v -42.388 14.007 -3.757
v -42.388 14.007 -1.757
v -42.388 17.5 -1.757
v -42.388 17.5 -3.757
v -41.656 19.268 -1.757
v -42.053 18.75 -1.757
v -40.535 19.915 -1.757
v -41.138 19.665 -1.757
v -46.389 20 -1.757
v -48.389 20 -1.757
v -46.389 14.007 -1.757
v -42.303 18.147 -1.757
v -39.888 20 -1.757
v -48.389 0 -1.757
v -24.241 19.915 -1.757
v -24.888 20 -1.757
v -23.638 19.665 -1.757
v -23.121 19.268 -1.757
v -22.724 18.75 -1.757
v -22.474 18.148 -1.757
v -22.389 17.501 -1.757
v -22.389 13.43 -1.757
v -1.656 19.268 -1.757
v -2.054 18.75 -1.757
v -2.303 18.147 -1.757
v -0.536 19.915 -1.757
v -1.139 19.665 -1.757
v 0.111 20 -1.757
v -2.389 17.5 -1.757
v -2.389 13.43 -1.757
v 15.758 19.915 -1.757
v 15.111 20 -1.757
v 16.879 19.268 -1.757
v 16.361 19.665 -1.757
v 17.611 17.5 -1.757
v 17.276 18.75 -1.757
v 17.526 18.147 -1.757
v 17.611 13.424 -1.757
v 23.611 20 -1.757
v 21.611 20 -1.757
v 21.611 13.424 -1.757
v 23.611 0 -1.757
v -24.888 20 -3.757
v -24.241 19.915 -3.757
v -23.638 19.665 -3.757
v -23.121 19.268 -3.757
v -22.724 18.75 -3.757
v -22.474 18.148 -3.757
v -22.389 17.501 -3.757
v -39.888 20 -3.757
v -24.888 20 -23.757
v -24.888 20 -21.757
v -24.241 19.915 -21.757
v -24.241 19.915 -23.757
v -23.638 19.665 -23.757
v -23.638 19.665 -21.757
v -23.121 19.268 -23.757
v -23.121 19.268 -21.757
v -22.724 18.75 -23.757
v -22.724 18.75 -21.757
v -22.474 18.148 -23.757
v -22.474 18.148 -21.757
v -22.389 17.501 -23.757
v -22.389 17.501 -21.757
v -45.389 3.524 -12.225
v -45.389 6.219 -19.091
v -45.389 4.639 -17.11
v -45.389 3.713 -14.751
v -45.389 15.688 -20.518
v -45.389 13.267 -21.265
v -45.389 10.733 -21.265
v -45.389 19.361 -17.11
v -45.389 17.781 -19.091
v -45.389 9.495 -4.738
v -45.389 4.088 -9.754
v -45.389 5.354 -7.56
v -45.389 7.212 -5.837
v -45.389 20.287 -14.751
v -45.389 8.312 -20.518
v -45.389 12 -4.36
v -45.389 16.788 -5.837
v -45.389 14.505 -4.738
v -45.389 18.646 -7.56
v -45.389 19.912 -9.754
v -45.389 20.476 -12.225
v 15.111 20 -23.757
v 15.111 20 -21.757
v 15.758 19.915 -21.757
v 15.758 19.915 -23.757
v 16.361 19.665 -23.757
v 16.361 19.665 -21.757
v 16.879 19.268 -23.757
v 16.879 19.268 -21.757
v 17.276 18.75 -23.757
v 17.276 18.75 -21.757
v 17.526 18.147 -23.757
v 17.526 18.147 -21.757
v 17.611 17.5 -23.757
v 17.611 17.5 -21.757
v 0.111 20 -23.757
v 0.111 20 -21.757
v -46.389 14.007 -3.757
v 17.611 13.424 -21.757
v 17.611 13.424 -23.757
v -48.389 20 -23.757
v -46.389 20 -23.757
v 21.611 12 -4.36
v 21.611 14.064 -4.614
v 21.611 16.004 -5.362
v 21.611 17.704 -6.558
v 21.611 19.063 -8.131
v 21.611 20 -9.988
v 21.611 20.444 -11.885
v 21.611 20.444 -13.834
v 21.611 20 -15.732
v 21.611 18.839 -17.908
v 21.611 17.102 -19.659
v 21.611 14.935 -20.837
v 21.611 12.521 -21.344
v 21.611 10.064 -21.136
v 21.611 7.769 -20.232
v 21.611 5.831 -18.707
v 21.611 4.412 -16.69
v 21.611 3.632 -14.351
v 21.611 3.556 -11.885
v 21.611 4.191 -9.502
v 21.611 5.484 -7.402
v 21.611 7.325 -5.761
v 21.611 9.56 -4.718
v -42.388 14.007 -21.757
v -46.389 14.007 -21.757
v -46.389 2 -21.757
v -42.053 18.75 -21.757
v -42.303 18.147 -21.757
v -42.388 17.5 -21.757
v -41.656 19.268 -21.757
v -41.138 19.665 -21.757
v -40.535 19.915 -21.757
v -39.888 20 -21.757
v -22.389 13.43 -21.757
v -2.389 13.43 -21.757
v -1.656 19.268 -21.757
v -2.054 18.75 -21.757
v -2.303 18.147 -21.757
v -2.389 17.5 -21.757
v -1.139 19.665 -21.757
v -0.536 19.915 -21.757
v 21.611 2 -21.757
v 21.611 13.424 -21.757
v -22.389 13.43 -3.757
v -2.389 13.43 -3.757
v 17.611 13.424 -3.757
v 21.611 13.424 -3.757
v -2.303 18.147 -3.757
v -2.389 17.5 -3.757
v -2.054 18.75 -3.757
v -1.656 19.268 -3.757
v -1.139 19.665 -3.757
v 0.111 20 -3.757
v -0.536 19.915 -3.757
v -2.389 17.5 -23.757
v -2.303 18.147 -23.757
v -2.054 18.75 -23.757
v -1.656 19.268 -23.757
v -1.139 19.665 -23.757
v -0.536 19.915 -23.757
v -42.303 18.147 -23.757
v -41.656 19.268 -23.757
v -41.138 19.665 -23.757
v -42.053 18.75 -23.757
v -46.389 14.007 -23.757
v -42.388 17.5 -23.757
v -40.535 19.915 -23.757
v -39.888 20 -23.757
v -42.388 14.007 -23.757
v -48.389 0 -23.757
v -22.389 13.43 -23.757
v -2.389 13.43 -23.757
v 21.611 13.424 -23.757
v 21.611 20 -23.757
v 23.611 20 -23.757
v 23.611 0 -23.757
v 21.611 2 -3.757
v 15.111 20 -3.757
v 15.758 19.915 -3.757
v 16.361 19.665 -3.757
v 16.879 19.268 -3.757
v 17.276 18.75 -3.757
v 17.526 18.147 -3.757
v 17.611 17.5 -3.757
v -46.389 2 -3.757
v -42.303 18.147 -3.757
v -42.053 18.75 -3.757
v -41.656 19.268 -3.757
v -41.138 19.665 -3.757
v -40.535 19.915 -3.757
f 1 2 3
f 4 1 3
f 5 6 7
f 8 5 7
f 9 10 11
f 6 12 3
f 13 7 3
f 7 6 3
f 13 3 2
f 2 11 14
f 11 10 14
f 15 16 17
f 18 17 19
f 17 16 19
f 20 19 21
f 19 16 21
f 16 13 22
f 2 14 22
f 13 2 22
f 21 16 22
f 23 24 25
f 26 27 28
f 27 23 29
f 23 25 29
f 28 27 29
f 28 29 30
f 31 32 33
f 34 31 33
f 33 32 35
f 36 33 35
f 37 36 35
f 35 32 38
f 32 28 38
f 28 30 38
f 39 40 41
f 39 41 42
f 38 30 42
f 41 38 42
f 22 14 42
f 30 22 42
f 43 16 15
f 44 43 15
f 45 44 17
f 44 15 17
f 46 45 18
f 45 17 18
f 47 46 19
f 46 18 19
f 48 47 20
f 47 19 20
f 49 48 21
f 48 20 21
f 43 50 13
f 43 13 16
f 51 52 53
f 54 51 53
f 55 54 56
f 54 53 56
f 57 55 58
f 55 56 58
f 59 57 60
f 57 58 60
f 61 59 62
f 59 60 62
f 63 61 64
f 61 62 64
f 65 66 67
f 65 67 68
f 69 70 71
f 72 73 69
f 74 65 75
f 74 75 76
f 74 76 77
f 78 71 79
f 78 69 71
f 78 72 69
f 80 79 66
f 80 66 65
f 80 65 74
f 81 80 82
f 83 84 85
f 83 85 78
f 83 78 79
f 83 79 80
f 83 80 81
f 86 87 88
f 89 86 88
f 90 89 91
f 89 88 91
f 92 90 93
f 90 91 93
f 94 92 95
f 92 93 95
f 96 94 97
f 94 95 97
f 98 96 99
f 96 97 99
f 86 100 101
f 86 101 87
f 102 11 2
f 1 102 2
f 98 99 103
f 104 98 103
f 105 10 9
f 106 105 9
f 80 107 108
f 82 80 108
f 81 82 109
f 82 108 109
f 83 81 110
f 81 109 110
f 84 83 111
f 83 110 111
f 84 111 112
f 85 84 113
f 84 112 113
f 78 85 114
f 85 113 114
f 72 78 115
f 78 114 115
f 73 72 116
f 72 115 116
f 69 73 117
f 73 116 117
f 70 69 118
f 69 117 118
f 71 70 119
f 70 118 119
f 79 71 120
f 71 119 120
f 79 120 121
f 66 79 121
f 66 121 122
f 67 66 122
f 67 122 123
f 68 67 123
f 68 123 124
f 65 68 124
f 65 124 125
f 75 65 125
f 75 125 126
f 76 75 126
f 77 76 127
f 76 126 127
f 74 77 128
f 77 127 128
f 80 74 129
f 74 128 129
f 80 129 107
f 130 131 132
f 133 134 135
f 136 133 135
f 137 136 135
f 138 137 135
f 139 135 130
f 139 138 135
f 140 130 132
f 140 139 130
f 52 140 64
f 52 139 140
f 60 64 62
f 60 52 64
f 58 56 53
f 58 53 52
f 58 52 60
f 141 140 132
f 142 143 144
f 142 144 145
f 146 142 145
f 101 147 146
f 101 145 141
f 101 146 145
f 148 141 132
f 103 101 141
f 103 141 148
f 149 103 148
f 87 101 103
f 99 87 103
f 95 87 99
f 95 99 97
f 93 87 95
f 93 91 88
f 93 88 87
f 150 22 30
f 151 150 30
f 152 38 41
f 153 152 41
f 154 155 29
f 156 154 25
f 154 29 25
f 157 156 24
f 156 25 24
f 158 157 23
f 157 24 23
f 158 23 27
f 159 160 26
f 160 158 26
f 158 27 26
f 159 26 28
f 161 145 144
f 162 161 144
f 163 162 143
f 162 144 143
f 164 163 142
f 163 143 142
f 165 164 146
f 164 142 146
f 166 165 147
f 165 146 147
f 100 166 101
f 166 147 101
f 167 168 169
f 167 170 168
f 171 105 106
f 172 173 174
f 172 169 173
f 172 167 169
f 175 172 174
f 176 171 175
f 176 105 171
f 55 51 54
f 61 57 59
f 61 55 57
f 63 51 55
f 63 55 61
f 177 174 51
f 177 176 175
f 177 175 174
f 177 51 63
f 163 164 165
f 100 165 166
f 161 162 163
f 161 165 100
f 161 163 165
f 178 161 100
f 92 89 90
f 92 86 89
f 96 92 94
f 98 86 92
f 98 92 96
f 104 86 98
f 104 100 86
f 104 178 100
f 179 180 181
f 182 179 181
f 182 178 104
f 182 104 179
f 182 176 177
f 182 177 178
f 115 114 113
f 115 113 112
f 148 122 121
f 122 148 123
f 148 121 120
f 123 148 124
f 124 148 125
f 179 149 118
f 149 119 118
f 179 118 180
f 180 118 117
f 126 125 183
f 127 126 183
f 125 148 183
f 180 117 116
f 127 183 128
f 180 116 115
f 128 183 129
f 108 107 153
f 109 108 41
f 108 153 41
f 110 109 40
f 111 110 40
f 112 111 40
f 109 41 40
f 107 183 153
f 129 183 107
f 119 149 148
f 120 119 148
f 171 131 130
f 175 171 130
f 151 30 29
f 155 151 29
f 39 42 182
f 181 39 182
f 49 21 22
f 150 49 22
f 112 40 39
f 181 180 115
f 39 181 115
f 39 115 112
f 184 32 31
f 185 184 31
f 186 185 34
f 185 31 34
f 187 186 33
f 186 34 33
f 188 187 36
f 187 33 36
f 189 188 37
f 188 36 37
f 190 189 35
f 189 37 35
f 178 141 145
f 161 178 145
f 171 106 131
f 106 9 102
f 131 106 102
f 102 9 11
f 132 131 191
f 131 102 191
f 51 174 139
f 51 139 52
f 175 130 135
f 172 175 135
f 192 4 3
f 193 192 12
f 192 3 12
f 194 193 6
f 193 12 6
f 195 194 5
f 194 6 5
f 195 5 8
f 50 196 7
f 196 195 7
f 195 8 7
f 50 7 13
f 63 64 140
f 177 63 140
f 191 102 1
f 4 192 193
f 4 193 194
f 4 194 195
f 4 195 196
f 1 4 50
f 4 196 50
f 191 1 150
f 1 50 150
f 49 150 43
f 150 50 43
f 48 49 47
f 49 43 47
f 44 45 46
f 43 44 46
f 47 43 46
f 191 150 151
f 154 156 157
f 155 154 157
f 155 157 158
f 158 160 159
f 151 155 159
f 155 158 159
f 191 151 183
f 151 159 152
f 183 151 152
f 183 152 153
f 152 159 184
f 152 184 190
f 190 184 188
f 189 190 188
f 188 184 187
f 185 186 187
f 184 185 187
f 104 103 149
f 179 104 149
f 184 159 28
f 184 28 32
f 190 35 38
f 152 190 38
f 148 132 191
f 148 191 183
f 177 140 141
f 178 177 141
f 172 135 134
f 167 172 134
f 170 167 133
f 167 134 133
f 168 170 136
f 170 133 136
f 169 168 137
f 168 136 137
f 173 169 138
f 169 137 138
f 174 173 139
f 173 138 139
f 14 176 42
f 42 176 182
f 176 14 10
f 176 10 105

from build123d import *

# Parameters (mm, degrees)
SKETCH1_W           = 72
SKETCH1_H           = 22
BOSS_EXTRUDE1_DEPTH = 20
SKETCH2_W           = 68
SKETCH2_H           = 18
CUT_EXTRUDE1_DEPTH  = 18
CUT_EXTRUDE2_DEPTH  = 30
SKETCH5_R           = 8.5
BOSS_EXTRUDE3_DEPTH = 67


with BuildPart() as part:
    # Sketch1 → Boss-Extrude1 (new body)
    with BuildSketch(Plane(origin=(0, 0, 0), x_dir=(1, 0, 0), z_dir=(0, 1, 0))):
        with Locations((-12.388663968, 12.75708502)):
            Rectangle(SKETCH1_W, SKETCH1_H)
    extrude(amount=BOSS_EXTRUDE1_DEPTH)

    # Sketch2 → Cut-Extrude1 (cut)
    with BuildSketch(Plane(origin=(0, 20, 0), x_dir=(1, 0, 0), z_dir=(0, 1, 0))):
        with Locations((-12.388663968, 12.75708502)):
            Rectangle(SKETCH2_W, SKETCH2_H)
    extrude(amount=-CUT_EXTRUDE1_DEPTH, mode=Mode.SUBTRACT)

    # Sketch4 → Cut-Extrude2 (cut)
    with BuildSketch(Plane.XY.offset(-1.75708502)):
        with BuildLine():
            Line((-46.388663968, 20), (-46.388663968, 14.00702655))
            Line((-46.388663968, 14.00702655), (-42.387974224, 14.00702655))
            Line((-42.387974224, 14.00702655), (-42.387974224, 17.5))
            ThreePointArc((-42.387974224, 17.5), (-41.655741177, 19.267766953), (-39.887974224, 20))
            Line((-39.887974224, 20), (-46.388663968, 20))
        make_face()
        with BuildLine():
            Line((0.111336032, 20), (-24.887974224, 20))
            ThreePointArc((-24.887974224, 20), (-23.120694993, 19.267968974), (-22.388663968, 17.500689744))
            Line((-22.388663968, 17.500689744), (-22.388663968, 13.429648774))
            Line((-22.388663968, 13.429648774), (-2.388663968, 13.429648774))
            Line((-2.388663968, 13.429648774), (-2.388663968, 17.5))
            ThreePointArc((-2.388663968, 17.5), (-1.656430921, 19.267766953), (0.111336032, 20))
        make_face()
        with BuildLine():
            Line((21.611336032, 20), (15.111336032, 20))
            ThreePointArc((15.111336032, 20), (16.879102985, 19.267766953), (17.611336032, 17.5))
            Line((17.611336032, 17.5), (17.611336032, 13.424239873))
            Line((17.611336032, 13.424239873), (21.611336032, 13.424239873))
            Line((21.611336032, 13.424239873), (21.611336032, 20))
        make_face()
    extrude(amount=-CUT_EXTRUDE2_DEPTH, mode=Mode.SUBTRACT)

    # Sketch5 → Boss-Extrude3 (add)
    with BuildSketch(Plane.ZY.offset(-21.611336032)):
        with Locations((-12.859898676, 12)):
            Circle(SKETCH5_R)
    extrude(amount=BOSS_EXTRUDE3_DEPTH)


solid = part.part
